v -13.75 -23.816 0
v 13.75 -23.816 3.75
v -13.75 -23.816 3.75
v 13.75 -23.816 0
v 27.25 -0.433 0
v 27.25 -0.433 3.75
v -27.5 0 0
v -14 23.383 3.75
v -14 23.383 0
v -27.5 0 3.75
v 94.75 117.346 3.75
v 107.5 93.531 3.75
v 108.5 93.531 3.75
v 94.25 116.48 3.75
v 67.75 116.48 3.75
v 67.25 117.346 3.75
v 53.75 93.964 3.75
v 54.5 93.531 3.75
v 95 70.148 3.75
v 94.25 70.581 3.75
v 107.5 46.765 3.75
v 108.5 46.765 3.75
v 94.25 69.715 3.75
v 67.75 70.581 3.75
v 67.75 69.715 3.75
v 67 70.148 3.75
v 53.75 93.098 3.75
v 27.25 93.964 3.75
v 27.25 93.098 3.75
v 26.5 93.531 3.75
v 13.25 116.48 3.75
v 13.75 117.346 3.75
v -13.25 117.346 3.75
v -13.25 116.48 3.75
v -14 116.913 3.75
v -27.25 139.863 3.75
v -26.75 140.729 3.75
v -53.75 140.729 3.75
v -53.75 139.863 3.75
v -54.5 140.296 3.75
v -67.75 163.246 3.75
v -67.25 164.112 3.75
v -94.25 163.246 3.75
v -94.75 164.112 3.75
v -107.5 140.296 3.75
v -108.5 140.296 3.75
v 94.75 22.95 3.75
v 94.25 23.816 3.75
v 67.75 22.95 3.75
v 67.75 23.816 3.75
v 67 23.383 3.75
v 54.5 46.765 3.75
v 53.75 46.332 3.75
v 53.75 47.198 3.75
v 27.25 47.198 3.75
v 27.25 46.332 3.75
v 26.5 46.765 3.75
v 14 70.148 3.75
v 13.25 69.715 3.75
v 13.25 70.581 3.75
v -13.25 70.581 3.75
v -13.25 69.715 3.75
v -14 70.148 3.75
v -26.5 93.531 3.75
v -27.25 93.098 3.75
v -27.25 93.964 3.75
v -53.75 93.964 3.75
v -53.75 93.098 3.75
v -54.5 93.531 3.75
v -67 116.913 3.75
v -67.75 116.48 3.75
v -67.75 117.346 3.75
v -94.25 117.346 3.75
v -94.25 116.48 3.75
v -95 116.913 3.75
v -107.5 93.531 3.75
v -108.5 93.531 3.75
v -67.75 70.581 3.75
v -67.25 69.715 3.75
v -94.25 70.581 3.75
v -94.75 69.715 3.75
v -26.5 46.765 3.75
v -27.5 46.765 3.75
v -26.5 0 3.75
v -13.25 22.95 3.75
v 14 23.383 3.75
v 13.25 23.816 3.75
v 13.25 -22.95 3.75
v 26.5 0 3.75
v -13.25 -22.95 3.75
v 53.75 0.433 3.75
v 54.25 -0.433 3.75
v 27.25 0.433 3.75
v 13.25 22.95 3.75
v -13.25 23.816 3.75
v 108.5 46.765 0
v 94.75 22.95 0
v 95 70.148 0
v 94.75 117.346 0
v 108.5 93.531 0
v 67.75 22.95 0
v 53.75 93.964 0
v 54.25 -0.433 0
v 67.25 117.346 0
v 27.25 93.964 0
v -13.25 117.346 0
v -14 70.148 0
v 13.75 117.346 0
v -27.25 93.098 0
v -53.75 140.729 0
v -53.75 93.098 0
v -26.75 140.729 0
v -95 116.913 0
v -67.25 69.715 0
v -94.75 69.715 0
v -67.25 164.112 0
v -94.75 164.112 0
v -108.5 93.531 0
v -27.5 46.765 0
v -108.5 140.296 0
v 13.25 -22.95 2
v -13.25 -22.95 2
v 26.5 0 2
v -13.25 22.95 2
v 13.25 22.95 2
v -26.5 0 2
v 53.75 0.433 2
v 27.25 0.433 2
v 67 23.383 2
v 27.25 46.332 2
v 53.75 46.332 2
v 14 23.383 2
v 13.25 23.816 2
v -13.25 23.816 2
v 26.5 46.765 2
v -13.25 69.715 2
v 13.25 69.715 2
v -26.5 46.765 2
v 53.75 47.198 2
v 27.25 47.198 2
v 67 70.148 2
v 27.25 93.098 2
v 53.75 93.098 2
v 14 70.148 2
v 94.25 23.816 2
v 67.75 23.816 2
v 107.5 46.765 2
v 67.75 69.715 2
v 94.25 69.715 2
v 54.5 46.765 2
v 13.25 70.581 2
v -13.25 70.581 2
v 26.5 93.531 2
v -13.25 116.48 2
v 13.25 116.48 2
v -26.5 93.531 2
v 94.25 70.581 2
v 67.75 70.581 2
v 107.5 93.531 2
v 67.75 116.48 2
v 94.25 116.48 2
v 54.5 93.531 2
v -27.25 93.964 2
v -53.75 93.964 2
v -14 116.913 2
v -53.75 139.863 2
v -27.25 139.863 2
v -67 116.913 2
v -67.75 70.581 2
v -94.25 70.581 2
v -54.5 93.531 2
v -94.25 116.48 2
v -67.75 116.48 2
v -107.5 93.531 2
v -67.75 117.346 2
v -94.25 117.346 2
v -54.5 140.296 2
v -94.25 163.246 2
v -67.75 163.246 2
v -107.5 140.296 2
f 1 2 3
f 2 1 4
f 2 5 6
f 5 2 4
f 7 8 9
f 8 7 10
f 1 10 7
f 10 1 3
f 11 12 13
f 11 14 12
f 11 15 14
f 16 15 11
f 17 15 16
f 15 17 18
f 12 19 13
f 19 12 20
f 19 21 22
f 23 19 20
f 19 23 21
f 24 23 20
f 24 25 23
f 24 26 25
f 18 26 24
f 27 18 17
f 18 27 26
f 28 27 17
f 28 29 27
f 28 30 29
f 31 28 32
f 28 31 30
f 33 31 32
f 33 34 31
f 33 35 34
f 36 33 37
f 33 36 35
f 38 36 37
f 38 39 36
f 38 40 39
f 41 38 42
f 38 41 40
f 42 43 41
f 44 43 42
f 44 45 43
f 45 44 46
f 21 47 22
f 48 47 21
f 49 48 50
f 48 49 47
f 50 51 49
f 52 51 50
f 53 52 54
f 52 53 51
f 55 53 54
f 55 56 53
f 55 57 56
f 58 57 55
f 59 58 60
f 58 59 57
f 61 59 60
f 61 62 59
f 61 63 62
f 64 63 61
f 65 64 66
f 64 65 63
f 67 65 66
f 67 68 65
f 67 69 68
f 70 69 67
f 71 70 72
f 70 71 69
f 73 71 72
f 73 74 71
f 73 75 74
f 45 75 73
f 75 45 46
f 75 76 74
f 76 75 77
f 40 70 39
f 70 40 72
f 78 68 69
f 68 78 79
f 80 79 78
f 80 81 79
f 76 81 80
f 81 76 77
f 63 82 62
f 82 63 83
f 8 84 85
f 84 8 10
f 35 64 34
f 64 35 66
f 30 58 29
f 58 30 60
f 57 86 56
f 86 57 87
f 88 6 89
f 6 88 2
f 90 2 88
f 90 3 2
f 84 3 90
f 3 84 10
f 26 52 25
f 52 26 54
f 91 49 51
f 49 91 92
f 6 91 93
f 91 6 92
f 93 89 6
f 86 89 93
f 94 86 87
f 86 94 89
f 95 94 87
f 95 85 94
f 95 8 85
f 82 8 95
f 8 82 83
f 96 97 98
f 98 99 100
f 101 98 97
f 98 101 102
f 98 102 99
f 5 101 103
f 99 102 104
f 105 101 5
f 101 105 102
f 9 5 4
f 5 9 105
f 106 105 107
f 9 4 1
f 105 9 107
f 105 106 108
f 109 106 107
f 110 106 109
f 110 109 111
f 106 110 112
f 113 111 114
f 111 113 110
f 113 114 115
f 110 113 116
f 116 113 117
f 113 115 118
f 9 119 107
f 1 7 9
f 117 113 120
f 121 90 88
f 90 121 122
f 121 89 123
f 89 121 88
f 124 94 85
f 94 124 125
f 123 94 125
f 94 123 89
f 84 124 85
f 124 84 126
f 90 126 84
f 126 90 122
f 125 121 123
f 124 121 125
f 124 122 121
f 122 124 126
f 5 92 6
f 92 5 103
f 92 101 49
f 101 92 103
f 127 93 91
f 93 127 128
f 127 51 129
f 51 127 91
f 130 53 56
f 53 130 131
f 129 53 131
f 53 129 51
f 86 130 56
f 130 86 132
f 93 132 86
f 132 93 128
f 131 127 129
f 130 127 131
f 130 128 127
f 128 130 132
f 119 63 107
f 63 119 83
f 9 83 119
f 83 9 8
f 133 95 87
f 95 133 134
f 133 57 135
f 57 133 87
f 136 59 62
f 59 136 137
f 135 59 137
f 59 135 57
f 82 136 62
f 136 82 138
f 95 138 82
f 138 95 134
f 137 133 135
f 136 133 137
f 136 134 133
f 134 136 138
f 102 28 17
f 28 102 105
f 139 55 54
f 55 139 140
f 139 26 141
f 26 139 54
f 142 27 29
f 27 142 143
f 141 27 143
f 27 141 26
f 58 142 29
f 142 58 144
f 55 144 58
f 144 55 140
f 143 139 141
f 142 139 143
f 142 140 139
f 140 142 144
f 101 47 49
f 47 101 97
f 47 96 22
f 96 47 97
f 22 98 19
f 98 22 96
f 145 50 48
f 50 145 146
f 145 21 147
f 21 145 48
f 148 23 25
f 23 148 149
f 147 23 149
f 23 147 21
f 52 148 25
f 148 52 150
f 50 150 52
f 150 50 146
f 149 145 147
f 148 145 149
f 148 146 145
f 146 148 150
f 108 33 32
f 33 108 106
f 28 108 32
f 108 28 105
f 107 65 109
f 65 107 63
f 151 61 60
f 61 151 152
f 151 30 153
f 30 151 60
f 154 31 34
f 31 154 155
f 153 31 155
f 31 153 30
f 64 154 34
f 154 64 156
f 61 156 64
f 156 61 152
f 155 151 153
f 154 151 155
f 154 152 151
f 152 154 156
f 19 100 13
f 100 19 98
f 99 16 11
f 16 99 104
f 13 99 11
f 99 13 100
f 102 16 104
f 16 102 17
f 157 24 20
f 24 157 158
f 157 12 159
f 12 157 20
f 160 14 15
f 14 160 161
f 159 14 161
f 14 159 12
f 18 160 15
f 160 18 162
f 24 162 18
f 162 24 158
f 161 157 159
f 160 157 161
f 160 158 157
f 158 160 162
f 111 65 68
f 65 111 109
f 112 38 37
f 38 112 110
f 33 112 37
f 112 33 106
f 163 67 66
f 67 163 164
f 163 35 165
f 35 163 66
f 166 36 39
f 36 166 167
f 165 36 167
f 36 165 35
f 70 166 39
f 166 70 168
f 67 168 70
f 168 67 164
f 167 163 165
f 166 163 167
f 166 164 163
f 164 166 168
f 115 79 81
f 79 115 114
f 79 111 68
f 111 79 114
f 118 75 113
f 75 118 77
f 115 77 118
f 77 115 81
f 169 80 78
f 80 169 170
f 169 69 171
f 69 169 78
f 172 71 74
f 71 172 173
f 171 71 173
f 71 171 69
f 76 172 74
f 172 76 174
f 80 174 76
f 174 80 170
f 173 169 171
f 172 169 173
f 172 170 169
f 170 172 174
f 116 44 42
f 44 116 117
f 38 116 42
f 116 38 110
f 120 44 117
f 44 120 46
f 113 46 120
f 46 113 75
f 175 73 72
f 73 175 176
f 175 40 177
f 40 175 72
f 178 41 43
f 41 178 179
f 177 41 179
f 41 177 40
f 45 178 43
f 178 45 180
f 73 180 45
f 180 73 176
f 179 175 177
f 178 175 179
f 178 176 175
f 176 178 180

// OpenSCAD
union() {
	translate(v = [0.0, 0.0, 0]) {
		difference() {
			cylinder($fn = 6, d = 55.0, h = 3.75);
			translate(v = [0, 0, 2.0]) {
				cylinder($fn = 6, d = 53.0, h = 2.75);
			}
		}
	}
	translate(v = [40.5, 23.38268590217984, 0]) {
		difference() {
			cylinder($fn = 6, d = 55.0, h = 3.75);
			translate(v = [0, 0, 2.0]) {
				cylinder($fn = 6, d = 53.0, h = 2.75);
			}
		}
	}
	translate(v = [0.0, 46.76537180435968, 0]) {
		difference() {
			cylinder($fn = 6, d = 55.0, h = 3.75);
			translate(v = [0, 0, 2.0]) {
				cylinder($fn = 6, d = 53.0, h = 2.75);
			}
		}
	}
	translate(v = [40.5, 70.14805770653952, 0]) {
		difference() {
			cylinder($fn = 6, d = 55.0, h = 3.75);
			translate(v = [0, 0, 2.0]) {
				cylinder($fn = 6, d = 53.0, h = 2.75);
			}
		}
	}
	translate(v = [81.0, 46.76537180435968, 0]) {
		difference() {
			cylinder($fn = 6, d = 55.0, h = 3.75);
			translate(v = [0, 0, 2.0]) {
				cylinder($fn = 6, d = 53.0, h = 2.75);
			}
		}
	}
	translate(v = [0.0, 93.53074360871936, 0]) {
		difference() {
			cylinder($fn = 6, d = 55.0, h = 3.75);
			translate(v = [0, 0, 2.0]) {
				cylinder($fn = 6, d = 53.0, h = 2.75);
			}
		}
	}
	translate(v = [81.0, 93.53074360871936, 0]) {
		difference() {
			cylinder($fn = 6, d = 55.0, h = 3.75);
			translate(v = [0, 0, 2.0]) {
				cylinder($fn = 6, d = 53.0, h = 2.75);
			}
		}
	}
	translate(v = [-40.5, 116.9134295108992, 0]) {
		difference() {
			cylinder($fn = 6, d = 55.0, h = 3.75);
			translate(v = [0, 0, 2.0]) {
				cylinder($fn = 6, d = 53.0, h = 2.75);
			}
		}
	}
	translate(v = [-81.0, 93.53074360871936, 0]) {
		difference() {
			cylinder($fn = 6, d = 55.0, h = 3.75);
			translate(v = [0, 0, 2.0]) {
				cylinder($fn = 6, d = 53.0, h = 2.75);
			}
		}
	}
	translate(v = [-81.0, 140.29611541307904, 0]) {
		difference() {
			cylinder($fn = 6, d = 55.0, h = 3.75);
			translate(v = [0, 0, 2.0]) {
				cylinder($fn = 6, d = 53.0, h = 2.75);
			}
		}
	}
}
